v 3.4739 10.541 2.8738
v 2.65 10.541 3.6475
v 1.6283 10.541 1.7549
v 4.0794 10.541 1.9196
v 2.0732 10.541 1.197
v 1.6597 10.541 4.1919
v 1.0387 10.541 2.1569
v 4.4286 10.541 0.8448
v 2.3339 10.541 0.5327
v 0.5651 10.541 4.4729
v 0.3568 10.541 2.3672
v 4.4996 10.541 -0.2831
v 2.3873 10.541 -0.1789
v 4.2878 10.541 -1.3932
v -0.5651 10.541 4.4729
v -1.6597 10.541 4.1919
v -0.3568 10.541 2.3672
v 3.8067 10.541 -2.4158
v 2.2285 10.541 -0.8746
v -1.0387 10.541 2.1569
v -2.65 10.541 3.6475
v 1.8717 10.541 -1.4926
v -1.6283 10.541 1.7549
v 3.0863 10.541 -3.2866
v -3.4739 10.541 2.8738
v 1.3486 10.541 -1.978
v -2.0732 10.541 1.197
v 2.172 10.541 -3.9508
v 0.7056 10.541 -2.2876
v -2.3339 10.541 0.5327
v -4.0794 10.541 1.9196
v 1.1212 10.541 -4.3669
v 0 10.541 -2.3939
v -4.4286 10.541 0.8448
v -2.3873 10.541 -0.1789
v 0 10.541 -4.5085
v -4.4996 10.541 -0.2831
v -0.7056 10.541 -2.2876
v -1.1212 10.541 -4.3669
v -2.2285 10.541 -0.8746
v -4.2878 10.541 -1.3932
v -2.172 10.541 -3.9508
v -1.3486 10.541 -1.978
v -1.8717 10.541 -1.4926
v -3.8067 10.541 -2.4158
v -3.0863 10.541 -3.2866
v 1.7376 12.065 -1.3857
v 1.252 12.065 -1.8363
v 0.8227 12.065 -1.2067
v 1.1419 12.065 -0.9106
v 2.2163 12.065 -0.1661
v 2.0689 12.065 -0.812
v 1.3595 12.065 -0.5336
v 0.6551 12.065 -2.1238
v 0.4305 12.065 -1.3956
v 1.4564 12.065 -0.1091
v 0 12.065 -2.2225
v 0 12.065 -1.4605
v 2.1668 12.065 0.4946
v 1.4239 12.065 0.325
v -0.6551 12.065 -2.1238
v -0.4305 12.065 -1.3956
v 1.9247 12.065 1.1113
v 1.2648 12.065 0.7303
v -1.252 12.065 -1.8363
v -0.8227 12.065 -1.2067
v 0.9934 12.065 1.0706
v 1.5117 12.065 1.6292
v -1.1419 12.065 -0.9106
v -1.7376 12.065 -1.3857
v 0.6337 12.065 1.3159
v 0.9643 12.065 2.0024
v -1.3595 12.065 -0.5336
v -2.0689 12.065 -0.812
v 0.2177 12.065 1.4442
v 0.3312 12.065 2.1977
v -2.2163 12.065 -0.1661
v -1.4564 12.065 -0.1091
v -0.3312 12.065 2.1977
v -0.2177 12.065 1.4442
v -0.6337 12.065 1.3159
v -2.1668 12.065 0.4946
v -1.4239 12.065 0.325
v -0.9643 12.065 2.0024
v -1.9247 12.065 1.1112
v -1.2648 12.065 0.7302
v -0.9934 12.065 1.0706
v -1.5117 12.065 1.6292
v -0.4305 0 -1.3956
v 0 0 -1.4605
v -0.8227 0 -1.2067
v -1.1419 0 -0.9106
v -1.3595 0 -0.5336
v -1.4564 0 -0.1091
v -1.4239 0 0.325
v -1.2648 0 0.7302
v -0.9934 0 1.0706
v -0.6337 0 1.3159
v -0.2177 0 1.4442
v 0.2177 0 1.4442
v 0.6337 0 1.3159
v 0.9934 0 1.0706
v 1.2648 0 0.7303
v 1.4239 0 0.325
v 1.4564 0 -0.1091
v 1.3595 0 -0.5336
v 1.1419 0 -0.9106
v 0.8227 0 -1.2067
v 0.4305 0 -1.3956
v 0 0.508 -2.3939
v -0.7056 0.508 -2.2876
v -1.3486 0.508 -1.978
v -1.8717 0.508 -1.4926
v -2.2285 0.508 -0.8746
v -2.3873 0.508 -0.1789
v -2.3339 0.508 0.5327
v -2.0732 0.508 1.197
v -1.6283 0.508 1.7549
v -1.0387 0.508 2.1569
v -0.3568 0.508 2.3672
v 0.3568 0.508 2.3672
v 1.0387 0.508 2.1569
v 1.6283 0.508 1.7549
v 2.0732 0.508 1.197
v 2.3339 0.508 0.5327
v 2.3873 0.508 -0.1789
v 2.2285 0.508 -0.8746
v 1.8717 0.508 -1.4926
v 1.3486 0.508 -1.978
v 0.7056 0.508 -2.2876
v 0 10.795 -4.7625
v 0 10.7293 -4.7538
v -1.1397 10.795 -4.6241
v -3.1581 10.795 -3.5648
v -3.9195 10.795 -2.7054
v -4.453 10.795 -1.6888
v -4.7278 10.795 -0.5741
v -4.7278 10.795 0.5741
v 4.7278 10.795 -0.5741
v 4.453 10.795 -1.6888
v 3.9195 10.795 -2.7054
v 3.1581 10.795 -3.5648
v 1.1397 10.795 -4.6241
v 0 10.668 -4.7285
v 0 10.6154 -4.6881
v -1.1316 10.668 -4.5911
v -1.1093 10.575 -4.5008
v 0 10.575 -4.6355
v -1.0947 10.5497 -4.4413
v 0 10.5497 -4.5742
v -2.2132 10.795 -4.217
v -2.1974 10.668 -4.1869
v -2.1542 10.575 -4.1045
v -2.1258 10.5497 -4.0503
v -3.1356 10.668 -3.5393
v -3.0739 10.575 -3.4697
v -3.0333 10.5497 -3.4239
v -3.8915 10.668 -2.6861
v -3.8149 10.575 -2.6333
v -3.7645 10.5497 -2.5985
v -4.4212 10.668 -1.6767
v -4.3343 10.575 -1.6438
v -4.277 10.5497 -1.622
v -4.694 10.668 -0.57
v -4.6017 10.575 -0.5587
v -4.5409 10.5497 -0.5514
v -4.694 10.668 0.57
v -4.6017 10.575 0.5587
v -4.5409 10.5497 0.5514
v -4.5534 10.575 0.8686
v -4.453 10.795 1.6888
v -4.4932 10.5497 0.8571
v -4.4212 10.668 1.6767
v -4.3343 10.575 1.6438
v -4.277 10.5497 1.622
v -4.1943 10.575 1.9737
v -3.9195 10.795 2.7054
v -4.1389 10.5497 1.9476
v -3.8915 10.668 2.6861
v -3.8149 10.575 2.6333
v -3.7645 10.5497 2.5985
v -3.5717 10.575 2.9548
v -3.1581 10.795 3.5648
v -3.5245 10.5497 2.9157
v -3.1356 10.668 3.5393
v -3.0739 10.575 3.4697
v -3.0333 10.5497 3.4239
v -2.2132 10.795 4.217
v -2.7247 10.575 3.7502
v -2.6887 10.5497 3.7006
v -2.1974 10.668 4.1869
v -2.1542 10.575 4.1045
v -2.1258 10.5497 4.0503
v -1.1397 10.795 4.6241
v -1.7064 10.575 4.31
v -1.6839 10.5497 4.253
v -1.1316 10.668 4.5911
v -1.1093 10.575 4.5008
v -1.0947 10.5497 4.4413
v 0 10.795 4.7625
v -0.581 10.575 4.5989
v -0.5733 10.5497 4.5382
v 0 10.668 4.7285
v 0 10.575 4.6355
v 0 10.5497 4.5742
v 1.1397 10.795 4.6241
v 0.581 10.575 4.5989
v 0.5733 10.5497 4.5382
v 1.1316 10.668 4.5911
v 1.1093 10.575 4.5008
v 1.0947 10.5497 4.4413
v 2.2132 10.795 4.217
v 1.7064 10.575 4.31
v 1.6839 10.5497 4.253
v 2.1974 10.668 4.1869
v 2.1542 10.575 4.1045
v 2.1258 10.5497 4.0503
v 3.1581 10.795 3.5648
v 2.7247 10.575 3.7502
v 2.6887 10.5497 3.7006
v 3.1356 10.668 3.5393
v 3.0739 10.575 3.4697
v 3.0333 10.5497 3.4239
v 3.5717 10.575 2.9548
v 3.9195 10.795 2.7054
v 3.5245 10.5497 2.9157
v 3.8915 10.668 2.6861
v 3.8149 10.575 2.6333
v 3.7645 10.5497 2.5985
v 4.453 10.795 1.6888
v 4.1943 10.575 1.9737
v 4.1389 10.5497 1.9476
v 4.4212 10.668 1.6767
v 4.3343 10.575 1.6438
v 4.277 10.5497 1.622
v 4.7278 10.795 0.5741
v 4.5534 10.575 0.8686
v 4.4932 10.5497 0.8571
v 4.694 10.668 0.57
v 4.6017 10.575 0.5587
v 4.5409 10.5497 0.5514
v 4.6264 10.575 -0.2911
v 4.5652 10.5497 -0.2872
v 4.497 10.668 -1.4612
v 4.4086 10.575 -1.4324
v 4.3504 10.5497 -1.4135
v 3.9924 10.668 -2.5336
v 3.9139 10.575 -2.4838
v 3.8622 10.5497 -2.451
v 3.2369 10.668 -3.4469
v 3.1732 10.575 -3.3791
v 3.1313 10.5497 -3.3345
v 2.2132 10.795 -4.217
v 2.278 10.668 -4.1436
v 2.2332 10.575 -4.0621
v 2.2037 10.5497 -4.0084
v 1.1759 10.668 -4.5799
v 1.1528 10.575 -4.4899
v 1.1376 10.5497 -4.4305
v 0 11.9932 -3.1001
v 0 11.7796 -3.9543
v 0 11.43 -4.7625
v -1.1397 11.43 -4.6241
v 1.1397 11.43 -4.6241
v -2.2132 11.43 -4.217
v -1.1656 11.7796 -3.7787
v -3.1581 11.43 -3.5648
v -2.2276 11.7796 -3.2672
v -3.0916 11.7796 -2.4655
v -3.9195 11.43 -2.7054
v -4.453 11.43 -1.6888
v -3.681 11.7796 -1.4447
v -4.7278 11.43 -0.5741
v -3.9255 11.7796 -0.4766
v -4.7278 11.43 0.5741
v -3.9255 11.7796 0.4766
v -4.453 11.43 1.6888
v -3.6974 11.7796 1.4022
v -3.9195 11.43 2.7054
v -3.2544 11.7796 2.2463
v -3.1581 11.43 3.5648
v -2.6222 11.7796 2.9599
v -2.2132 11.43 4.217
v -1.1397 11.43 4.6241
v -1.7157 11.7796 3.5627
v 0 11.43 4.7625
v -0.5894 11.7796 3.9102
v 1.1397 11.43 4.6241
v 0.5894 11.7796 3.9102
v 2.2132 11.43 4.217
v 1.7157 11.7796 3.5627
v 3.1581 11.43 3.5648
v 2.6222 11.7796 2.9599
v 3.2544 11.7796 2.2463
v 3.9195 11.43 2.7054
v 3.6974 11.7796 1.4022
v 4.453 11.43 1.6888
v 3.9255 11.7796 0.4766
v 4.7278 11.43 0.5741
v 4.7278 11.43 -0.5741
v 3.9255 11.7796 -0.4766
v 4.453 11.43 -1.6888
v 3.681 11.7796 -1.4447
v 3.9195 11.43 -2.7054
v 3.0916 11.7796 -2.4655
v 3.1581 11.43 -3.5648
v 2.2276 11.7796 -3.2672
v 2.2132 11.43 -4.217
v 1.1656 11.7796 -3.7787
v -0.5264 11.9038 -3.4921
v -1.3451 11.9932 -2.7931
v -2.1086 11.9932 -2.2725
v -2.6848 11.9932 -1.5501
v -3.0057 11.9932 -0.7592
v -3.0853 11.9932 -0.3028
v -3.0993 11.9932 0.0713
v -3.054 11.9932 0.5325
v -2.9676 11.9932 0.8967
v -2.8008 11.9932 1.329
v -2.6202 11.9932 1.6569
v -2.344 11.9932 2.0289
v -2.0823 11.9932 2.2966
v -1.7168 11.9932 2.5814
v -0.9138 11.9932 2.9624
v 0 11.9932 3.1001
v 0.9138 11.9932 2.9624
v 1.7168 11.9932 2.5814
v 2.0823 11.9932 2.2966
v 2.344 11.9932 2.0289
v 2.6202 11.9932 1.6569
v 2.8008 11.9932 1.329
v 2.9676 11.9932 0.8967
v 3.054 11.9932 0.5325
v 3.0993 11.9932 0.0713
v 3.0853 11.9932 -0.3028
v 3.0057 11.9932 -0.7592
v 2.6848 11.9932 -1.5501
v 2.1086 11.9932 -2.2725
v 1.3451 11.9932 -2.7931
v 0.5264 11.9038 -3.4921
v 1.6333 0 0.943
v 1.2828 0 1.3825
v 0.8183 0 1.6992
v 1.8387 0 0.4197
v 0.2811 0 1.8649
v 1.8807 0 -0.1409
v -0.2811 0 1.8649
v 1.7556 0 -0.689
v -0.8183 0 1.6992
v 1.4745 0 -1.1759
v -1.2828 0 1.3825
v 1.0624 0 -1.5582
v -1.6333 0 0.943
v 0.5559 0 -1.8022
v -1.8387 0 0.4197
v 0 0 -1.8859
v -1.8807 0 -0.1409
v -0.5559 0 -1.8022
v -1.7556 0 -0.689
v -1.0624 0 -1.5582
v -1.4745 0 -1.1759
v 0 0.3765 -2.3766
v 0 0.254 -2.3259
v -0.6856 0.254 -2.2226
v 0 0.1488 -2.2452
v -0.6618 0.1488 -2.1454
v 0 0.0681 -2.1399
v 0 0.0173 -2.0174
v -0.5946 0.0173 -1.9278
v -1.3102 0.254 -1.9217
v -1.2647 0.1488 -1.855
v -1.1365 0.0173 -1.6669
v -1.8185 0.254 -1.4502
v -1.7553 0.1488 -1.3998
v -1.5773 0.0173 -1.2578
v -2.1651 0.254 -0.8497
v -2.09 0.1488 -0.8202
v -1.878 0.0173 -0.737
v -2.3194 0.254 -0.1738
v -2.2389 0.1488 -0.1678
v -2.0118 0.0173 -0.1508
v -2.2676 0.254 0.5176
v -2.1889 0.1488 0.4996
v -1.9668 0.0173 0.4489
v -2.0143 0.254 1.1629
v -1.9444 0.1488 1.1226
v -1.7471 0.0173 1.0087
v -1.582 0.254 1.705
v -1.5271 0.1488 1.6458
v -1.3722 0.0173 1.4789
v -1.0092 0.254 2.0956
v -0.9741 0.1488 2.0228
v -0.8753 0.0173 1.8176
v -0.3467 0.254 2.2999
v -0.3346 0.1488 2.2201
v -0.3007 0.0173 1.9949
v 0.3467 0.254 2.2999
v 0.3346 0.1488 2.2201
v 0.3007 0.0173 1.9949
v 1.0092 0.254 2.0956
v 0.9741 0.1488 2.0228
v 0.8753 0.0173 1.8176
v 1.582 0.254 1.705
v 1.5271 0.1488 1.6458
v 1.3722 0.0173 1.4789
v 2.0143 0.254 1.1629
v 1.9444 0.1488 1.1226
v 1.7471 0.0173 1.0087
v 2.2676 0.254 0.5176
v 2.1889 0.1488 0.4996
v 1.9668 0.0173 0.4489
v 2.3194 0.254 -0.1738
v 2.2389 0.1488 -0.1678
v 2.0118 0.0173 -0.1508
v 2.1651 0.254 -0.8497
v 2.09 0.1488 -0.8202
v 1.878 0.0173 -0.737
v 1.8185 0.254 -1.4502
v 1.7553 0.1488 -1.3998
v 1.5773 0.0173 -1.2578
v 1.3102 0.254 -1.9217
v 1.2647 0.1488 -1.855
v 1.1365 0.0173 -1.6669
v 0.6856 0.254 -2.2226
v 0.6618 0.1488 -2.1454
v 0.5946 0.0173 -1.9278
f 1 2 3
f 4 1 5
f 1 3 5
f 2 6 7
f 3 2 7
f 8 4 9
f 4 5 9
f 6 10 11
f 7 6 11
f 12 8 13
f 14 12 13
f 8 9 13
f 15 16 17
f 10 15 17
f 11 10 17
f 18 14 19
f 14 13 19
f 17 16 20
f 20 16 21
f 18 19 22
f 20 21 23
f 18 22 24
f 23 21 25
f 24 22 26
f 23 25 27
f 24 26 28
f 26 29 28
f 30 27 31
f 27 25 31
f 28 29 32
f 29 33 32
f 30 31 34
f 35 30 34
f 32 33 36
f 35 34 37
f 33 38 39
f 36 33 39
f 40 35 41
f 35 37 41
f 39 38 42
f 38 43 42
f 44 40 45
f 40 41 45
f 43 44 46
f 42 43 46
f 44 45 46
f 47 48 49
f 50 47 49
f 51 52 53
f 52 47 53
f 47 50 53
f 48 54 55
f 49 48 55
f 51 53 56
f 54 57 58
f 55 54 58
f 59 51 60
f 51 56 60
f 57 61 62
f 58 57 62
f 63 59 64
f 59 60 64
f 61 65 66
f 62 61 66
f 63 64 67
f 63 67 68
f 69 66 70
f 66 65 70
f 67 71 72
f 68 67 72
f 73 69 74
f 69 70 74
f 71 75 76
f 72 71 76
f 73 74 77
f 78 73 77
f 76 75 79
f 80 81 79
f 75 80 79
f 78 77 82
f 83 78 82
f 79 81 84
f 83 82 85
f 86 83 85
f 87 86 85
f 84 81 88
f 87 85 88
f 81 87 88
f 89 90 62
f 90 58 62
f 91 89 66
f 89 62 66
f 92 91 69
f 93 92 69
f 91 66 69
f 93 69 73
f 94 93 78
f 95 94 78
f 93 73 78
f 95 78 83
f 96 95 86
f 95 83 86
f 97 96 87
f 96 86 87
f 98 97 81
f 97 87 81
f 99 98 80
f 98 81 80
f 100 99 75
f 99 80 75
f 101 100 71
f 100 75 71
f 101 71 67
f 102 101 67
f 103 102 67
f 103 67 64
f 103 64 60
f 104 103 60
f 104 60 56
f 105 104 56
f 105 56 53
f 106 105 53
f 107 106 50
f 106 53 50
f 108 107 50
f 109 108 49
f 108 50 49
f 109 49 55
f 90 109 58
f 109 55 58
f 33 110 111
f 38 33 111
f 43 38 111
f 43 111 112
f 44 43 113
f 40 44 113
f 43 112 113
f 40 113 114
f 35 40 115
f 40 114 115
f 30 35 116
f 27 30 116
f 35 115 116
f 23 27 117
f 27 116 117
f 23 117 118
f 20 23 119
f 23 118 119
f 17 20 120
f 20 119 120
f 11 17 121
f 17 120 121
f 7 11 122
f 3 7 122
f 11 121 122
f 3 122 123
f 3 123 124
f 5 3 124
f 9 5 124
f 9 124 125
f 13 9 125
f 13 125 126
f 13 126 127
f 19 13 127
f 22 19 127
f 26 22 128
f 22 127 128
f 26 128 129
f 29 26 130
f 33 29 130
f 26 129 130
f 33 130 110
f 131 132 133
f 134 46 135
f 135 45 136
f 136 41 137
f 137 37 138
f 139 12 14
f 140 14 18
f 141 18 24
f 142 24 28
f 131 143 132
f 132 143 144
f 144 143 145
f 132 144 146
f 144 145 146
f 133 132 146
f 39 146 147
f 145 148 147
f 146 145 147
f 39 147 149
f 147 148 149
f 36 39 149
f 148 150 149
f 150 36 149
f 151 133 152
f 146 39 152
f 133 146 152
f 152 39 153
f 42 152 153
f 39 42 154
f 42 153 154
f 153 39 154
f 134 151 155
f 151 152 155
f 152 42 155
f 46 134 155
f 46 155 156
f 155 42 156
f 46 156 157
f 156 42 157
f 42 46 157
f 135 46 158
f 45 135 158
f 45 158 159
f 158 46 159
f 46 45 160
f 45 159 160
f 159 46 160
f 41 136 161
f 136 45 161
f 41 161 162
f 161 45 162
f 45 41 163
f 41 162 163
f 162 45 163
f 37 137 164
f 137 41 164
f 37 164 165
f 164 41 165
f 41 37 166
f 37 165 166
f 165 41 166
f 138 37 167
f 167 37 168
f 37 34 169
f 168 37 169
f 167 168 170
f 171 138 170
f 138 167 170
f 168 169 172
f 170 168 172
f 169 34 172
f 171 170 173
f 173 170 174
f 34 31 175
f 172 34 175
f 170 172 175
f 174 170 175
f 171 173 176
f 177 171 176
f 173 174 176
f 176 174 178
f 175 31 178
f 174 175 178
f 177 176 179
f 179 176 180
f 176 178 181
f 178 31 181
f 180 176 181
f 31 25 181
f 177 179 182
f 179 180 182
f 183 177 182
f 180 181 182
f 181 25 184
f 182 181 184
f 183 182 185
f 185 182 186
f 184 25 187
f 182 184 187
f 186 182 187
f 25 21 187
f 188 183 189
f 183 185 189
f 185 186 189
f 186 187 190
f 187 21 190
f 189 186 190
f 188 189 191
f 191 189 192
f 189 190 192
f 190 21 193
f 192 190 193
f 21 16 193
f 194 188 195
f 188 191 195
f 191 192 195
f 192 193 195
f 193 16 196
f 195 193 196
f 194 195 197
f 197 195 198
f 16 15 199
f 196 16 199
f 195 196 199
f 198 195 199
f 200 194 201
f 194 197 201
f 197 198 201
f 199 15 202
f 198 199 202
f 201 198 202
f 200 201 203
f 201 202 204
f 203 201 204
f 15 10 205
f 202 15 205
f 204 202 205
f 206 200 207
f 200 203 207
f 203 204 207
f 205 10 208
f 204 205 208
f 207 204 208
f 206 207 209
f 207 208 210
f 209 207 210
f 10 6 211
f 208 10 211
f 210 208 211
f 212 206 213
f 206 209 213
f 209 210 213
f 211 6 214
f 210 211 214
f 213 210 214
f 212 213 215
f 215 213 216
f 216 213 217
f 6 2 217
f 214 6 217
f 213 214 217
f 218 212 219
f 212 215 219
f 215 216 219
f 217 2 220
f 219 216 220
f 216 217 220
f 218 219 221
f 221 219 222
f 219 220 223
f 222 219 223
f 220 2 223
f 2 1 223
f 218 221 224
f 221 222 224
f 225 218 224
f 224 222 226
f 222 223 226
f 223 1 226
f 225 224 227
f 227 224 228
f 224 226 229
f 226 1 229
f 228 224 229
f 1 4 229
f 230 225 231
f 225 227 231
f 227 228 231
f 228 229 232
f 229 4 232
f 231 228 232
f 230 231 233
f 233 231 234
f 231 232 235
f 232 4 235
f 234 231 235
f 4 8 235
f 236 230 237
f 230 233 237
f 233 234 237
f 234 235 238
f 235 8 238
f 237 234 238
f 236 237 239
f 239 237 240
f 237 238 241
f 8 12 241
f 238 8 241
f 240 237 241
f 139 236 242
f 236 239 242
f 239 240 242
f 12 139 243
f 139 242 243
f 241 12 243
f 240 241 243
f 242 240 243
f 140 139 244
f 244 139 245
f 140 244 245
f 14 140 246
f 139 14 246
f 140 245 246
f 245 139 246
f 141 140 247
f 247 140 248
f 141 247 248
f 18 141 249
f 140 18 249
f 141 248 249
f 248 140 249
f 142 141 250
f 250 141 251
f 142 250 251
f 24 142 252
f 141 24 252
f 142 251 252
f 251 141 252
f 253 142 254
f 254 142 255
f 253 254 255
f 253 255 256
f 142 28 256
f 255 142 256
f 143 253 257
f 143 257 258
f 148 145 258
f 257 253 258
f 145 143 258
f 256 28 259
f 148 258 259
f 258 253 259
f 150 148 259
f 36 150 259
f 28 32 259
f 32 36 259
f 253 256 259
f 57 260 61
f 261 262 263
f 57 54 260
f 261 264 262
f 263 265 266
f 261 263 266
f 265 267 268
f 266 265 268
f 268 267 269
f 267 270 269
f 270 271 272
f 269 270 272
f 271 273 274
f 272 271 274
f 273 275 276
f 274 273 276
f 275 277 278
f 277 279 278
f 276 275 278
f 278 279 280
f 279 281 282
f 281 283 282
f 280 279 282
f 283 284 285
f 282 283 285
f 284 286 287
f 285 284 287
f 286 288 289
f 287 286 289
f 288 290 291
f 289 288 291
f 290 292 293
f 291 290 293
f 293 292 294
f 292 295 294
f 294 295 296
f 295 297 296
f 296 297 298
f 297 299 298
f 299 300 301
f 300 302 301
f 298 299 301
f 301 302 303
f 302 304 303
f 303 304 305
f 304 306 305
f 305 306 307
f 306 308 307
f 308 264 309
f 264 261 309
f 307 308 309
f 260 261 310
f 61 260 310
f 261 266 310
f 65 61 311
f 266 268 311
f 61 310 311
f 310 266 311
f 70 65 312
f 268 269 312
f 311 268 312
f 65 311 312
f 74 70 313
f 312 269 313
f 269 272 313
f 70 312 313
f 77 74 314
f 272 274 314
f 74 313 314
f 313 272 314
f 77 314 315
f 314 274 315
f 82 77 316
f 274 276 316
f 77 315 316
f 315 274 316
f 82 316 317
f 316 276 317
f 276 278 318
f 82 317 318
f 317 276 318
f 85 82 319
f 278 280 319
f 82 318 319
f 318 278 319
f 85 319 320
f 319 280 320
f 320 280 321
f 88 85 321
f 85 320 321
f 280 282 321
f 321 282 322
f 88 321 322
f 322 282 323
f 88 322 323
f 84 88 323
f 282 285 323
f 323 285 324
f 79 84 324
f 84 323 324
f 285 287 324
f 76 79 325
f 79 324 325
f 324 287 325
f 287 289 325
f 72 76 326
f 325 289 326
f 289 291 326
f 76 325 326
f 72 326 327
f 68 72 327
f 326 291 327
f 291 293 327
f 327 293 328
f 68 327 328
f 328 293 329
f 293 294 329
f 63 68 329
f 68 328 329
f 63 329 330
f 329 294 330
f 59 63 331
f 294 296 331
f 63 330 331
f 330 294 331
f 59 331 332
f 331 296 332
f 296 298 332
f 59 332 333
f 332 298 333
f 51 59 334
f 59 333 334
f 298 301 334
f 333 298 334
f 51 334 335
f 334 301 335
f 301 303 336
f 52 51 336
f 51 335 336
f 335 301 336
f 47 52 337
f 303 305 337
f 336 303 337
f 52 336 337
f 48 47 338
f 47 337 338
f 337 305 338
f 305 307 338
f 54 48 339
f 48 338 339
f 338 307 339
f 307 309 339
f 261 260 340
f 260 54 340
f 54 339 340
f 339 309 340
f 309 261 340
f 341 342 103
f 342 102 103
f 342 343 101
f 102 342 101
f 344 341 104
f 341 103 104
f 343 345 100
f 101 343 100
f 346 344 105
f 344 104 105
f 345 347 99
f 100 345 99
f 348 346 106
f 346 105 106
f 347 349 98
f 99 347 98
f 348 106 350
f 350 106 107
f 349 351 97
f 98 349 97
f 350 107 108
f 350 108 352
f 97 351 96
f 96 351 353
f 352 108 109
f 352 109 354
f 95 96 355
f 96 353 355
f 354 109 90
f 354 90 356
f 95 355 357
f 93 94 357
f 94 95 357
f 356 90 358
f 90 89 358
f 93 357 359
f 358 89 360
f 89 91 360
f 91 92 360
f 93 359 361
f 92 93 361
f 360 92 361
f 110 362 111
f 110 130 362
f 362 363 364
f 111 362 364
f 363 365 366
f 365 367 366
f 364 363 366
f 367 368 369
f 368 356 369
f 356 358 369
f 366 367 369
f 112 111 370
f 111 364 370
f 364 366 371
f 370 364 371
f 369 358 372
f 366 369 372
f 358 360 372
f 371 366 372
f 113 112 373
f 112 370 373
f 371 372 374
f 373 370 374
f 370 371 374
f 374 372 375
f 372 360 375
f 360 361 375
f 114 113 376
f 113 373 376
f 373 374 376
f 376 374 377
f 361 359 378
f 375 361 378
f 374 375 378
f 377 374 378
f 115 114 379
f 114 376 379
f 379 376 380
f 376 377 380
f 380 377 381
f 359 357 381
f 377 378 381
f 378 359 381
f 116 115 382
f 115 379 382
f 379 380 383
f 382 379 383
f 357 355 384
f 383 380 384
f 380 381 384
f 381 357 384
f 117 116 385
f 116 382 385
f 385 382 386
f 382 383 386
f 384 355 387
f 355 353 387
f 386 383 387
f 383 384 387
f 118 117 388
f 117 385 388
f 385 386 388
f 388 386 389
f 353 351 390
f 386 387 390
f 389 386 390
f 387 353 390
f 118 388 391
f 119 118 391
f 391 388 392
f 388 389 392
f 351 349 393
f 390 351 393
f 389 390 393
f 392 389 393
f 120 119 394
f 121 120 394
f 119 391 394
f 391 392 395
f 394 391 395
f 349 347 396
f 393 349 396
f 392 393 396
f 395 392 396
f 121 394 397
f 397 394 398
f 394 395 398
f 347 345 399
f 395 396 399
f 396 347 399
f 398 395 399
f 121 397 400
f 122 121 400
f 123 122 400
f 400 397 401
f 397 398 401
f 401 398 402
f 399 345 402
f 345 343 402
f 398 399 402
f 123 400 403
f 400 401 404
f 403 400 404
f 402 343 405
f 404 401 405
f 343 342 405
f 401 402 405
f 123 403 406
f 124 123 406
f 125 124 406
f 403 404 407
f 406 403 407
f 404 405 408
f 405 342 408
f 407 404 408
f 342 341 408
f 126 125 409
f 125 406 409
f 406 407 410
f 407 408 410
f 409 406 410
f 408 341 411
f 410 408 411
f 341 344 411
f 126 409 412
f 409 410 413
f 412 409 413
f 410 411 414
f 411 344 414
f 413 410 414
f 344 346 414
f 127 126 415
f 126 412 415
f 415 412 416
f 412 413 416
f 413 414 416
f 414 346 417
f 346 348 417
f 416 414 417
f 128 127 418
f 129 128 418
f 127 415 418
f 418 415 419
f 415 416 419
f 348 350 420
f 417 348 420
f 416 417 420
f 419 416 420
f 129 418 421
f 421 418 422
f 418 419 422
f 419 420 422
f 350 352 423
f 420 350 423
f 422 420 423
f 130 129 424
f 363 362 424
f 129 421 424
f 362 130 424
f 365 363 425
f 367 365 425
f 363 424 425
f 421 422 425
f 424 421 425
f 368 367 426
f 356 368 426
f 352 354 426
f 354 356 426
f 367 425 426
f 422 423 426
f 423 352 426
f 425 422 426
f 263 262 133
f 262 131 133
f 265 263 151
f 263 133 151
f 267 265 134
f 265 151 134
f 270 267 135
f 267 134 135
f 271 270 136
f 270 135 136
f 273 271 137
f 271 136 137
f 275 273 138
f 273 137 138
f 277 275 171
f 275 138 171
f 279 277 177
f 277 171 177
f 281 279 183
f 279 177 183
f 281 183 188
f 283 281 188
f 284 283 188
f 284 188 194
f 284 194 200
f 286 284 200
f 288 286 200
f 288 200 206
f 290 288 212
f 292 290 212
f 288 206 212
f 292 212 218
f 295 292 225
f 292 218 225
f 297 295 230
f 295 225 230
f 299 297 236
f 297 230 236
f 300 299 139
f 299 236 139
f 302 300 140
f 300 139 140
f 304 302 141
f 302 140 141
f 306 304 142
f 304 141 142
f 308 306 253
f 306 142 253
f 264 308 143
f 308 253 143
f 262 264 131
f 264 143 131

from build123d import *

# Parameters (mm, degrees)
FILLET1_R = 0.508


with BuildPart() as part:
    # Sketch1 → Revolve1 (revolve)
    with BuildSketch(Plane.XY, mode=Mode.PRIVATE) as revolve1_sk:
        with BuildLine():
            Line((-1.4605, 0), (-1.4605, 12.065))
            Line((-1.4605, 12.065), (-2.2225, 12.065))
            ThreePointArc((-2.2225, 12.065), (-3.531586036, 11.903844145), (-4.7625, 11.43))
            Line((-4.7625, 11.43), (-4.7625, 10.795))
            ThreePointArc((-4.7625, 10.795), (-4.688105122, 10.615394878), (-4.5085, 10.541))
            Line((-4.5085, 10.541), (-2.39395, 10.541))
            Line((-2.39395, 10.541), (-2.39395, 0))
            Line((-2.39395, 0), (-1.4605, 0))
        make_face()
    revolve(revolve1_sk.sketch.rotate(Axis((0, 0, 0), (0, 1, 0)), 270), axis=Axis((0, 0, 0), (0, 1, 0)))

    # Fillet1
    fillet1_edges = [part.edges().sort_by_distance(p)[0] for p in [
        (0, 0, 2.39395),
    ]]
    fillet(fillet1_edges, radius=FILLET1_R)


solid = part.part
